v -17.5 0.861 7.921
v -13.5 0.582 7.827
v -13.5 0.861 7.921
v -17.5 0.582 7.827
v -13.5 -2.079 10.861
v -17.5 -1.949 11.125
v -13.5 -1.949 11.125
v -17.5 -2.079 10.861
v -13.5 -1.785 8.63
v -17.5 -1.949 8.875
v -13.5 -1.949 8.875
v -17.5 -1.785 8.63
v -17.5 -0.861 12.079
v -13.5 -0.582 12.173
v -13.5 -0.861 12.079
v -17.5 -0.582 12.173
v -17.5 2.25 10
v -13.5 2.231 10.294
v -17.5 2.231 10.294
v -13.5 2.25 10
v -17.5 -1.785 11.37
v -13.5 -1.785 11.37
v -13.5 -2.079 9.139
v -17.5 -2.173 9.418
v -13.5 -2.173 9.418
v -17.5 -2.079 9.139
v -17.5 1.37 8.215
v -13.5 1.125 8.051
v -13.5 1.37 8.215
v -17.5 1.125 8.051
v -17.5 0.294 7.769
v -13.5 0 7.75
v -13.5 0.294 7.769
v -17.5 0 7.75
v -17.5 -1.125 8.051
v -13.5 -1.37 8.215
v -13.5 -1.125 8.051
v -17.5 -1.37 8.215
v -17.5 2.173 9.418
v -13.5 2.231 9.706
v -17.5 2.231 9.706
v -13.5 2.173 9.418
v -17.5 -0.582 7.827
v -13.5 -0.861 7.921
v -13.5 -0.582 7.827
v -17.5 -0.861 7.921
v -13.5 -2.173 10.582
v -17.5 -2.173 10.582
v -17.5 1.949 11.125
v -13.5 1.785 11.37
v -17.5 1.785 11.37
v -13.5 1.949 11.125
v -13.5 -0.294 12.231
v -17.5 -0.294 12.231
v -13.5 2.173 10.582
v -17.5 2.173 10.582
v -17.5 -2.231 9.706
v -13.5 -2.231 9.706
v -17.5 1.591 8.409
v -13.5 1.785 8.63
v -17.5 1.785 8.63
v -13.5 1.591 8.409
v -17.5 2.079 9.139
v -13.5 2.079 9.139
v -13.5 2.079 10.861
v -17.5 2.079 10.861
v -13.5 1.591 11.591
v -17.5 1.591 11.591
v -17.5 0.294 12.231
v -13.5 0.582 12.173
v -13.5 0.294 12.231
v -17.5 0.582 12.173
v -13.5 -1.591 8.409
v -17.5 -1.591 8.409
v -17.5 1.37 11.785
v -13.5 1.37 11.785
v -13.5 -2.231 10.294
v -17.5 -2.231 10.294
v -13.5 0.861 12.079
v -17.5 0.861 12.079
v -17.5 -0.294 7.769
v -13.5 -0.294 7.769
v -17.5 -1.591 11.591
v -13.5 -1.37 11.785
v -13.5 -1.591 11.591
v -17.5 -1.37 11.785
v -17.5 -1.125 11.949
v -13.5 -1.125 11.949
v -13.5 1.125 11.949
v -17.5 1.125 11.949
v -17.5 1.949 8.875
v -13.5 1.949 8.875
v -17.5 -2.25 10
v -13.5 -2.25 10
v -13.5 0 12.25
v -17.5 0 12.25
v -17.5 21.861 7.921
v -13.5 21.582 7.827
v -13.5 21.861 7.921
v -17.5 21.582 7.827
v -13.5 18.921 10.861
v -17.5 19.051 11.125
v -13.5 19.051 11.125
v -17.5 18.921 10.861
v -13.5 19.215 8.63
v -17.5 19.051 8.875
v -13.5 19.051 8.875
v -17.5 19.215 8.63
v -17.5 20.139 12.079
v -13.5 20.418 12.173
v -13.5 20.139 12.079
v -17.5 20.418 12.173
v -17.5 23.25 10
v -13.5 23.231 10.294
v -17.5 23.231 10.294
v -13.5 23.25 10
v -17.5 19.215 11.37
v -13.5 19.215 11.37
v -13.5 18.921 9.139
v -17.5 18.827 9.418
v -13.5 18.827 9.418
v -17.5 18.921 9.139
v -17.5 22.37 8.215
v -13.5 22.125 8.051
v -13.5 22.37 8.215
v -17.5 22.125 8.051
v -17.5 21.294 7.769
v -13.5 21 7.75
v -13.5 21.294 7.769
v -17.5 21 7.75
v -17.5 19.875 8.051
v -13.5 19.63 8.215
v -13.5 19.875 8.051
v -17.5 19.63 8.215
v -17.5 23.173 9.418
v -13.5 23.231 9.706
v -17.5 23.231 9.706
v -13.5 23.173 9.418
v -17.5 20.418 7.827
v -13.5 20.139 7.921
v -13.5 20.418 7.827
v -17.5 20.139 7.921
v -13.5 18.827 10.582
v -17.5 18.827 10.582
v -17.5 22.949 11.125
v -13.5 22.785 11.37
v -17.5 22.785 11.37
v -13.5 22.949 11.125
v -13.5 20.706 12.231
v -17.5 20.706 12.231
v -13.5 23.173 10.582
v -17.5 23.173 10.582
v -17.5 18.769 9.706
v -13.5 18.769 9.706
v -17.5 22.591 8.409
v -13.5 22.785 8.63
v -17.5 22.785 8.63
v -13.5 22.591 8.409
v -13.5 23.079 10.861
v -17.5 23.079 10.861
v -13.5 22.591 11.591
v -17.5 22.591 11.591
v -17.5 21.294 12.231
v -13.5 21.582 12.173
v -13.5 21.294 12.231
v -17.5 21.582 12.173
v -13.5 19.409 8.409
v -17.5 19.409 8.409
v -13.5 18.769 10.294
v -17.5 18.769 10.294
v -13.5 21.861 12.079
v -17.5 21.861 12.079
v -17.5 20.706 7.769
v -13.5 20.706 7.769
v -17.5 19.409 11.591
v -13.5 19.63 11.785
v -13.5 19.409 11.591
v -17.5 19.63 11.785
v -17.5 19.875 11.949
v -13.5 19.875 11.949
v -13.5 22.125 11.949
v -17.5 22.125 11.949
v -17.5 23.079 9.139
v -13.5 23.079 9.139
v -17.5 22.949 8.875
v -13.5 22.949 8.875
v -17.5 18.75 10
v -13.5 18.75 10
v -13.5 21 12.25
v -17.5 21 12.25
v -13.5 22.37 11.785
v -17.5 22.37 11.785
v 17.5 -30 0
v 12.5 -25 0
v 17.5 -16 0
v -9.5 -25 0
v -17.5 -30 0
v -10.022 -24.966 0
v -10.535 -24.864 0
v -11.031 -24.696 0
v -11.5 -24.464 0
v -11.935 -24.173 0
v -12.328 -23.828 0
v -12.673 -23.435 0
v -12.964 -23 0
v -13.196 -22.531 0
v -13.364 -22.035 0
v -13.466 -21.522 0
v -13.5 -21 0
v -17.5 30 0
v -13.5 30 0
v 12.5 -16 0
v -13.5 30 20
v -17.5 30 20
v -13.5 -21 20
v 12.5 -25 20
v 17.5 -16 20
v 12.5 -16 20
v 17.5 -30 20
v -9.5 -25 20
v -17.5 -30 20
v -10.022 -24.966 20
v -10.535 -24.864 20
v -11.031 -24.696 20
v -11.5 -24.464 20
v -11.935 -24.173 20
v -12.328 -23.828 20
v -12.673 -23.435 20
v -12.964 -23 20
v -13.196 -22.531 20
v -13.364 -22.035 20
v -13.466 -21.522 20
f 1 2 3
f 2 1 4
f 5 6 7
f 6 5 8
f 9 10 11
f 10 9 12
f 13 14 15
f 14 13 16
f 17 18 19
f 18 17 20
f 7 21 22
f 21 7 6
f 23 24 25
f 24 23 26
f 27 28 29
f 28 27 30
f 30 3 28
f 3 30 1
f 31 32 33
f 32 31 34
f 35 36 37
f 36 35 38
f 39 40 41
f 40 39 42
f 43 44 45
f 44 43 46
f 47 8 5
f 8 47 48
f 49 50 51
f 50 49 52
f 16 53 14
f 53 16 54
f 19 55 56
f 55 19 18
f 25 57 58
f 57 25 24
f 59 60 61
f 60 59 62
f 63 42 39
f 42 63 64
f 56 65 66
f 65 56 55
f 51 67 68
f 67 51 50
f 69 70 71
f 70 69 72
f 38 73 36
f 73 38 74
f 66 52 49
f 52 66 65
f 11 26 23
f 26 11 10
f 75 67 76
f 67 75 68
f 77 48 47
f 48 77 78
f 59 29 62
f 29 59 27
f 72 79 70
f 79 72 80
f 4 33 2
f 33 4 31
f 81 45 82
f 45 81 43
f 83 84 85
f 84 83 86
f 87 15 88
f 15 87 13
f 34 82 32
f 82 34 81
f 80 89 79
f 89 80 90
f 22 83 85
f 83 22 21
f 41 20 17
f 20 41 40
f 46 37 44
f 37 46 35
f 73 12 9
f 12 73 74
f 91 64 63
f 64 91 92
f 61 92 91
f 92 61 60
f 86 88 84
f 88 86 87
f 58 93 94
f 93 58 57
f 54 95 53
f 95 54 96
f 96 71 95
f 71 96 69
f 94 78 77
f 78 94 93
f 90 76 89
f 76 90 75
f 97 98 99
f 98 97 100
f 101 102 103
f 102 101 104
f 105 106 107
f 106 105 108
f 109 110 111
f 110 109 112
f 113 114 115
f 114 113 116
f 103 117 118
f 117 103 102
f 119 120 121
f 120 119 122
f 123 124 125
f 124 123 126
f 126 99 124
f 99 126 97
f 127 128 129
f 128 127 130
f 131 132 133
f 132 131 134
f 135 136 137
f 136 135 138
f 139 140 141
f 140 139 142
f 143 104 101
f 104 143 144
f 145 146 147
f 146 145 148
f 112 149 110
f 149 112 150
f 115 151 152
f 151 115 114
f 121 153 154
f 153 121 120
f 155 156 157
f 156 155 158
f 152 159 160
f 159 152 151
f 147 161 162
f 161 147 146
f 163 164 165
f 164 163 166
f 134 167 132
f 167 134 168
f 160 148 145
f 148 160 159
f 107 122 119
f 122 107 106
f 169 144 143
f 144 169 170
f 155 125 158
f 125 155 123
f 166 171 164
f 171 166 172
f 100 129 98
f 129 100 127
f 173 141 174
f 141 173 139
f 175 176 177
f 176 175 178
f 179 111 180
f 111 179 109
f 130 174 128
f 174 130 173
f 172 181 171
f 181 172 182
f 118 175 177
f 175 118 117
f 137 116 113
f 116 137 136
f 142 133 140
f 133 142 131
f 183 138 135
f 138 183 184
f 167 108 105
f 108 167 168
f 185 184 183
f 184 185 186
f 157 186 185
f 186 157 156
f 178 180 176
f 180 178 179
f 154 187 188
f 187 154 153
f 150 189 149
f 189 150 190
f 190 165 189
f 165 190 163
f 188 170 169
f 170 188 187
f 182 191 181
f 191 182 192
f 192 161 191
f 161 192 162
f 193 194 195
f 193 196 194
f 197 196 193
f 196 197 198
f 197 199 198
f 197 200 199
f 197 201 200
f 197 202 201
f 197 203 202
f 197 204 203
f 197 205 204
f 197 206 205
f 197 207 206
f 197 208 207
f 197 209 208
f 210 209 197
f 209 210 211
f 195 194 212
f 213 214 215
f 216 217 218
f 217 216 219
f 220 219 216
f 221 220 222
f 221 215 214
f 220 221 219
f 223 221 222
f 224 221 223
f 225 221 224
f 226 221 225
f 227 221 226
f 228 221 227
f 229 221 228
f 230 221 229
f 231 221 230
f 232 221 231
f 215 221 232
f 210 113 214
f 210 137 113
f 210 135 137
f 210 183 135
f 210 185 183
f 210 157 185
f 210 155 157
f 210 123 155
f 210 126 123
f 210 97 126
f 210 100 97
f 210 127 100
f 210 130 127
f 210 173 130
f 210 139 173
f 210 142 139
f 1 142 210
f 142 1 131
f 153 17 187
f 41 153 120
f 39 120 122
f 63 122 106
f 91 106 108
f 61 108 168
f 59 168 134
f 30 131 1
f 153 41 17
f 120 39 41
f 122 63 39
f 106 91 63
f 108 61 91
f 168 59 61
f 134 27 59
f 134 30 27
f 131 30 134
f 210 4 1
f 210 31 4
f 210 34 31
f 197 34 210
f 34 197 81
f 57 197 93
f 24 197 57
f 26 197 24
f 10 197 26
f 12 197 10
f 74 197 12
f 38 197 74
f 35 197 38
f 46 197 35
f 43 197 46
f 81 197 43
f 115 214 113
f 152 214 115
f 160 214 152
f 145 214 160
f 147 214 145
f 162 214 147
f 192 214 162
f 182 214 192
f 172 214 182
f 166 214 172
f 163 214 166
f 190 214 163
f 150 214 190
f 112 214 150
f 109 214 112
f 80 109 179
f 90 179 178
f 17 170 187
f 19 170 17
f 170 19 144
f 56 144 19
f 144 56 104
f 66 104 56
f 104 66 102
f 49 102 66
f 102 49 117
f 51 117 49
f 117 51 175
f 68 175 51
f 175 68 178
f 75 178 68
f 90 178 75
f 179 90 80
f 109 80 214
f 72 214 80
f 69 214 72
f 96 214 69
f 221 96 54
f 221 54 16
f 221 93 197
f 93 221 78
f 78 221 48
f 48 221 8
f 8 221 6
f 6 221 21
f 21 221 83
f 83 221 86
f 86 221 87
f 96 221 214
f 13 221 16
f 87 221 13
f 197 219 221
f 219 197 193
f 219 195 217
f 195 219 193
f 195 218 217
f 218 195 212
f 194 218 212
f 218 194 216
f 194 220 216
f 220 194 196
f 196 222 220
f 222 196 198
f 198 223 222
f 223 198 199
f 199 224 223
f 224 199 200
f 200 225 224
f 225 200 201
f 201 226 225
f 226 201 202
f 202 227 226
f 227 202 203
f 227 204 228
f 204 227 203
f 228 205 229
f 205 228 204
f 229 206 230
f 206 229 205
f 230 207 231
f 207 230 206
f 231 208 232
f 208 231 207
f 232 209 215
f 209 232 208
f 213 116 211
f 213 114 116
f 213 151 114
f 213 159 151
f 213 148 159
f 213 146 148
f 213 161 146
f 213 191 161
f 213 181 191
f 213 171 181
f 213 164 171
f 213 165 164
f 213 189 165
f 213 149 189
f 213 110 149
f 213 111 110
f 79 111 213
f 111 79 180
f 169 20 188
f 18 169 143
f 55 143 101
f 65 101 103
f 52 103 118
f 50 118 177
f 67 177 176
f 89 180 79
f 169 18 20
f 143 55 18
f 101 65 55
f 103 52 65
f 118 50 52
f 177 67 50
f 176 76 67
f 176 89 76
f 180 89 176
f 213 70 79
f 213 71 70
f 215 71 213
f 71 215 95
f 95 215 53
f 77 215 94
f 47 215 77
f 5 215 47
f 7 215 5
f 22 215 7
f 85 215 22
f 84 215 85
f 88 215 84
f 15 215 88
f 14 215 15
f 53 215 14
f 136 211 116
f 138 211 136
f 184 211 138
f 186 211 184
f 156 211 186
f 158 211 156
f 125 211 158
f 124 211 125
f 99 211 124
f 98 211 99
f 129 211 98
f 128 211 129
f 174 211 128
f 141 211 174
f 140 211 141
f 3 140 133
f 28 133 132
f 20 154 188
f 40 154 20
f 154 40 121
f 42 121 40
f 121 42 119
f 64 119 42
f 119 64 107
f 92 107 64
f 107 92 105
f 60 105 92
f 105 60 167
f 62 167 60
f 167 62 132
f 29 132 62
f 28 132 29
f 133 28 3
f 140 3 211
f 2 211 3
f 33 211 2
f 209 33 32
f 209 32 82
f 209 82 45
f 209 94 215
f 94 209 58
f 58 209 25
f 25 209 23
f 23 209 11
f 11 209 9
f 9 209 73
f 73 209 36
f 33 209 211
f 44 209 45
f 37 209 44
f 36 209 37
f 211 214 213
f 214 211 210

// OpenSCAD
// ARTIFEX template: wall hook (printed lying on its side for strength)
width = 20;
plate_h = 60;
plate_t = 4;
hook_depth = 30;
hook_t = 5;
lip_h = 14;
screw_d = 4.5;
$fn = 48;

module profile() {
    square([plate_t, plate_h]);
    square([hook_depth + hook_t, hook_t]);
    translate([hook_depth, 0]) square([hook_t, lip_h]);
    // fillet between plate and arm
    translate([plate_t, hook_t]) difference() {
        square([4, 4]);
        translate([4, 4]) circle(r = 4);
    }
}

translate([-(hook_depth + hook_t) / 2, -plate_h / 2, 0]) difference() {
    linear_extrude(width) profile();
    for (y = [plate_h * 0.5, plate_h * 0.85])
        translate([-1, y, width / 2]) rotate([0, 90, 0]) cylinder(d = screw_d, h = plate_t + 2);
}
